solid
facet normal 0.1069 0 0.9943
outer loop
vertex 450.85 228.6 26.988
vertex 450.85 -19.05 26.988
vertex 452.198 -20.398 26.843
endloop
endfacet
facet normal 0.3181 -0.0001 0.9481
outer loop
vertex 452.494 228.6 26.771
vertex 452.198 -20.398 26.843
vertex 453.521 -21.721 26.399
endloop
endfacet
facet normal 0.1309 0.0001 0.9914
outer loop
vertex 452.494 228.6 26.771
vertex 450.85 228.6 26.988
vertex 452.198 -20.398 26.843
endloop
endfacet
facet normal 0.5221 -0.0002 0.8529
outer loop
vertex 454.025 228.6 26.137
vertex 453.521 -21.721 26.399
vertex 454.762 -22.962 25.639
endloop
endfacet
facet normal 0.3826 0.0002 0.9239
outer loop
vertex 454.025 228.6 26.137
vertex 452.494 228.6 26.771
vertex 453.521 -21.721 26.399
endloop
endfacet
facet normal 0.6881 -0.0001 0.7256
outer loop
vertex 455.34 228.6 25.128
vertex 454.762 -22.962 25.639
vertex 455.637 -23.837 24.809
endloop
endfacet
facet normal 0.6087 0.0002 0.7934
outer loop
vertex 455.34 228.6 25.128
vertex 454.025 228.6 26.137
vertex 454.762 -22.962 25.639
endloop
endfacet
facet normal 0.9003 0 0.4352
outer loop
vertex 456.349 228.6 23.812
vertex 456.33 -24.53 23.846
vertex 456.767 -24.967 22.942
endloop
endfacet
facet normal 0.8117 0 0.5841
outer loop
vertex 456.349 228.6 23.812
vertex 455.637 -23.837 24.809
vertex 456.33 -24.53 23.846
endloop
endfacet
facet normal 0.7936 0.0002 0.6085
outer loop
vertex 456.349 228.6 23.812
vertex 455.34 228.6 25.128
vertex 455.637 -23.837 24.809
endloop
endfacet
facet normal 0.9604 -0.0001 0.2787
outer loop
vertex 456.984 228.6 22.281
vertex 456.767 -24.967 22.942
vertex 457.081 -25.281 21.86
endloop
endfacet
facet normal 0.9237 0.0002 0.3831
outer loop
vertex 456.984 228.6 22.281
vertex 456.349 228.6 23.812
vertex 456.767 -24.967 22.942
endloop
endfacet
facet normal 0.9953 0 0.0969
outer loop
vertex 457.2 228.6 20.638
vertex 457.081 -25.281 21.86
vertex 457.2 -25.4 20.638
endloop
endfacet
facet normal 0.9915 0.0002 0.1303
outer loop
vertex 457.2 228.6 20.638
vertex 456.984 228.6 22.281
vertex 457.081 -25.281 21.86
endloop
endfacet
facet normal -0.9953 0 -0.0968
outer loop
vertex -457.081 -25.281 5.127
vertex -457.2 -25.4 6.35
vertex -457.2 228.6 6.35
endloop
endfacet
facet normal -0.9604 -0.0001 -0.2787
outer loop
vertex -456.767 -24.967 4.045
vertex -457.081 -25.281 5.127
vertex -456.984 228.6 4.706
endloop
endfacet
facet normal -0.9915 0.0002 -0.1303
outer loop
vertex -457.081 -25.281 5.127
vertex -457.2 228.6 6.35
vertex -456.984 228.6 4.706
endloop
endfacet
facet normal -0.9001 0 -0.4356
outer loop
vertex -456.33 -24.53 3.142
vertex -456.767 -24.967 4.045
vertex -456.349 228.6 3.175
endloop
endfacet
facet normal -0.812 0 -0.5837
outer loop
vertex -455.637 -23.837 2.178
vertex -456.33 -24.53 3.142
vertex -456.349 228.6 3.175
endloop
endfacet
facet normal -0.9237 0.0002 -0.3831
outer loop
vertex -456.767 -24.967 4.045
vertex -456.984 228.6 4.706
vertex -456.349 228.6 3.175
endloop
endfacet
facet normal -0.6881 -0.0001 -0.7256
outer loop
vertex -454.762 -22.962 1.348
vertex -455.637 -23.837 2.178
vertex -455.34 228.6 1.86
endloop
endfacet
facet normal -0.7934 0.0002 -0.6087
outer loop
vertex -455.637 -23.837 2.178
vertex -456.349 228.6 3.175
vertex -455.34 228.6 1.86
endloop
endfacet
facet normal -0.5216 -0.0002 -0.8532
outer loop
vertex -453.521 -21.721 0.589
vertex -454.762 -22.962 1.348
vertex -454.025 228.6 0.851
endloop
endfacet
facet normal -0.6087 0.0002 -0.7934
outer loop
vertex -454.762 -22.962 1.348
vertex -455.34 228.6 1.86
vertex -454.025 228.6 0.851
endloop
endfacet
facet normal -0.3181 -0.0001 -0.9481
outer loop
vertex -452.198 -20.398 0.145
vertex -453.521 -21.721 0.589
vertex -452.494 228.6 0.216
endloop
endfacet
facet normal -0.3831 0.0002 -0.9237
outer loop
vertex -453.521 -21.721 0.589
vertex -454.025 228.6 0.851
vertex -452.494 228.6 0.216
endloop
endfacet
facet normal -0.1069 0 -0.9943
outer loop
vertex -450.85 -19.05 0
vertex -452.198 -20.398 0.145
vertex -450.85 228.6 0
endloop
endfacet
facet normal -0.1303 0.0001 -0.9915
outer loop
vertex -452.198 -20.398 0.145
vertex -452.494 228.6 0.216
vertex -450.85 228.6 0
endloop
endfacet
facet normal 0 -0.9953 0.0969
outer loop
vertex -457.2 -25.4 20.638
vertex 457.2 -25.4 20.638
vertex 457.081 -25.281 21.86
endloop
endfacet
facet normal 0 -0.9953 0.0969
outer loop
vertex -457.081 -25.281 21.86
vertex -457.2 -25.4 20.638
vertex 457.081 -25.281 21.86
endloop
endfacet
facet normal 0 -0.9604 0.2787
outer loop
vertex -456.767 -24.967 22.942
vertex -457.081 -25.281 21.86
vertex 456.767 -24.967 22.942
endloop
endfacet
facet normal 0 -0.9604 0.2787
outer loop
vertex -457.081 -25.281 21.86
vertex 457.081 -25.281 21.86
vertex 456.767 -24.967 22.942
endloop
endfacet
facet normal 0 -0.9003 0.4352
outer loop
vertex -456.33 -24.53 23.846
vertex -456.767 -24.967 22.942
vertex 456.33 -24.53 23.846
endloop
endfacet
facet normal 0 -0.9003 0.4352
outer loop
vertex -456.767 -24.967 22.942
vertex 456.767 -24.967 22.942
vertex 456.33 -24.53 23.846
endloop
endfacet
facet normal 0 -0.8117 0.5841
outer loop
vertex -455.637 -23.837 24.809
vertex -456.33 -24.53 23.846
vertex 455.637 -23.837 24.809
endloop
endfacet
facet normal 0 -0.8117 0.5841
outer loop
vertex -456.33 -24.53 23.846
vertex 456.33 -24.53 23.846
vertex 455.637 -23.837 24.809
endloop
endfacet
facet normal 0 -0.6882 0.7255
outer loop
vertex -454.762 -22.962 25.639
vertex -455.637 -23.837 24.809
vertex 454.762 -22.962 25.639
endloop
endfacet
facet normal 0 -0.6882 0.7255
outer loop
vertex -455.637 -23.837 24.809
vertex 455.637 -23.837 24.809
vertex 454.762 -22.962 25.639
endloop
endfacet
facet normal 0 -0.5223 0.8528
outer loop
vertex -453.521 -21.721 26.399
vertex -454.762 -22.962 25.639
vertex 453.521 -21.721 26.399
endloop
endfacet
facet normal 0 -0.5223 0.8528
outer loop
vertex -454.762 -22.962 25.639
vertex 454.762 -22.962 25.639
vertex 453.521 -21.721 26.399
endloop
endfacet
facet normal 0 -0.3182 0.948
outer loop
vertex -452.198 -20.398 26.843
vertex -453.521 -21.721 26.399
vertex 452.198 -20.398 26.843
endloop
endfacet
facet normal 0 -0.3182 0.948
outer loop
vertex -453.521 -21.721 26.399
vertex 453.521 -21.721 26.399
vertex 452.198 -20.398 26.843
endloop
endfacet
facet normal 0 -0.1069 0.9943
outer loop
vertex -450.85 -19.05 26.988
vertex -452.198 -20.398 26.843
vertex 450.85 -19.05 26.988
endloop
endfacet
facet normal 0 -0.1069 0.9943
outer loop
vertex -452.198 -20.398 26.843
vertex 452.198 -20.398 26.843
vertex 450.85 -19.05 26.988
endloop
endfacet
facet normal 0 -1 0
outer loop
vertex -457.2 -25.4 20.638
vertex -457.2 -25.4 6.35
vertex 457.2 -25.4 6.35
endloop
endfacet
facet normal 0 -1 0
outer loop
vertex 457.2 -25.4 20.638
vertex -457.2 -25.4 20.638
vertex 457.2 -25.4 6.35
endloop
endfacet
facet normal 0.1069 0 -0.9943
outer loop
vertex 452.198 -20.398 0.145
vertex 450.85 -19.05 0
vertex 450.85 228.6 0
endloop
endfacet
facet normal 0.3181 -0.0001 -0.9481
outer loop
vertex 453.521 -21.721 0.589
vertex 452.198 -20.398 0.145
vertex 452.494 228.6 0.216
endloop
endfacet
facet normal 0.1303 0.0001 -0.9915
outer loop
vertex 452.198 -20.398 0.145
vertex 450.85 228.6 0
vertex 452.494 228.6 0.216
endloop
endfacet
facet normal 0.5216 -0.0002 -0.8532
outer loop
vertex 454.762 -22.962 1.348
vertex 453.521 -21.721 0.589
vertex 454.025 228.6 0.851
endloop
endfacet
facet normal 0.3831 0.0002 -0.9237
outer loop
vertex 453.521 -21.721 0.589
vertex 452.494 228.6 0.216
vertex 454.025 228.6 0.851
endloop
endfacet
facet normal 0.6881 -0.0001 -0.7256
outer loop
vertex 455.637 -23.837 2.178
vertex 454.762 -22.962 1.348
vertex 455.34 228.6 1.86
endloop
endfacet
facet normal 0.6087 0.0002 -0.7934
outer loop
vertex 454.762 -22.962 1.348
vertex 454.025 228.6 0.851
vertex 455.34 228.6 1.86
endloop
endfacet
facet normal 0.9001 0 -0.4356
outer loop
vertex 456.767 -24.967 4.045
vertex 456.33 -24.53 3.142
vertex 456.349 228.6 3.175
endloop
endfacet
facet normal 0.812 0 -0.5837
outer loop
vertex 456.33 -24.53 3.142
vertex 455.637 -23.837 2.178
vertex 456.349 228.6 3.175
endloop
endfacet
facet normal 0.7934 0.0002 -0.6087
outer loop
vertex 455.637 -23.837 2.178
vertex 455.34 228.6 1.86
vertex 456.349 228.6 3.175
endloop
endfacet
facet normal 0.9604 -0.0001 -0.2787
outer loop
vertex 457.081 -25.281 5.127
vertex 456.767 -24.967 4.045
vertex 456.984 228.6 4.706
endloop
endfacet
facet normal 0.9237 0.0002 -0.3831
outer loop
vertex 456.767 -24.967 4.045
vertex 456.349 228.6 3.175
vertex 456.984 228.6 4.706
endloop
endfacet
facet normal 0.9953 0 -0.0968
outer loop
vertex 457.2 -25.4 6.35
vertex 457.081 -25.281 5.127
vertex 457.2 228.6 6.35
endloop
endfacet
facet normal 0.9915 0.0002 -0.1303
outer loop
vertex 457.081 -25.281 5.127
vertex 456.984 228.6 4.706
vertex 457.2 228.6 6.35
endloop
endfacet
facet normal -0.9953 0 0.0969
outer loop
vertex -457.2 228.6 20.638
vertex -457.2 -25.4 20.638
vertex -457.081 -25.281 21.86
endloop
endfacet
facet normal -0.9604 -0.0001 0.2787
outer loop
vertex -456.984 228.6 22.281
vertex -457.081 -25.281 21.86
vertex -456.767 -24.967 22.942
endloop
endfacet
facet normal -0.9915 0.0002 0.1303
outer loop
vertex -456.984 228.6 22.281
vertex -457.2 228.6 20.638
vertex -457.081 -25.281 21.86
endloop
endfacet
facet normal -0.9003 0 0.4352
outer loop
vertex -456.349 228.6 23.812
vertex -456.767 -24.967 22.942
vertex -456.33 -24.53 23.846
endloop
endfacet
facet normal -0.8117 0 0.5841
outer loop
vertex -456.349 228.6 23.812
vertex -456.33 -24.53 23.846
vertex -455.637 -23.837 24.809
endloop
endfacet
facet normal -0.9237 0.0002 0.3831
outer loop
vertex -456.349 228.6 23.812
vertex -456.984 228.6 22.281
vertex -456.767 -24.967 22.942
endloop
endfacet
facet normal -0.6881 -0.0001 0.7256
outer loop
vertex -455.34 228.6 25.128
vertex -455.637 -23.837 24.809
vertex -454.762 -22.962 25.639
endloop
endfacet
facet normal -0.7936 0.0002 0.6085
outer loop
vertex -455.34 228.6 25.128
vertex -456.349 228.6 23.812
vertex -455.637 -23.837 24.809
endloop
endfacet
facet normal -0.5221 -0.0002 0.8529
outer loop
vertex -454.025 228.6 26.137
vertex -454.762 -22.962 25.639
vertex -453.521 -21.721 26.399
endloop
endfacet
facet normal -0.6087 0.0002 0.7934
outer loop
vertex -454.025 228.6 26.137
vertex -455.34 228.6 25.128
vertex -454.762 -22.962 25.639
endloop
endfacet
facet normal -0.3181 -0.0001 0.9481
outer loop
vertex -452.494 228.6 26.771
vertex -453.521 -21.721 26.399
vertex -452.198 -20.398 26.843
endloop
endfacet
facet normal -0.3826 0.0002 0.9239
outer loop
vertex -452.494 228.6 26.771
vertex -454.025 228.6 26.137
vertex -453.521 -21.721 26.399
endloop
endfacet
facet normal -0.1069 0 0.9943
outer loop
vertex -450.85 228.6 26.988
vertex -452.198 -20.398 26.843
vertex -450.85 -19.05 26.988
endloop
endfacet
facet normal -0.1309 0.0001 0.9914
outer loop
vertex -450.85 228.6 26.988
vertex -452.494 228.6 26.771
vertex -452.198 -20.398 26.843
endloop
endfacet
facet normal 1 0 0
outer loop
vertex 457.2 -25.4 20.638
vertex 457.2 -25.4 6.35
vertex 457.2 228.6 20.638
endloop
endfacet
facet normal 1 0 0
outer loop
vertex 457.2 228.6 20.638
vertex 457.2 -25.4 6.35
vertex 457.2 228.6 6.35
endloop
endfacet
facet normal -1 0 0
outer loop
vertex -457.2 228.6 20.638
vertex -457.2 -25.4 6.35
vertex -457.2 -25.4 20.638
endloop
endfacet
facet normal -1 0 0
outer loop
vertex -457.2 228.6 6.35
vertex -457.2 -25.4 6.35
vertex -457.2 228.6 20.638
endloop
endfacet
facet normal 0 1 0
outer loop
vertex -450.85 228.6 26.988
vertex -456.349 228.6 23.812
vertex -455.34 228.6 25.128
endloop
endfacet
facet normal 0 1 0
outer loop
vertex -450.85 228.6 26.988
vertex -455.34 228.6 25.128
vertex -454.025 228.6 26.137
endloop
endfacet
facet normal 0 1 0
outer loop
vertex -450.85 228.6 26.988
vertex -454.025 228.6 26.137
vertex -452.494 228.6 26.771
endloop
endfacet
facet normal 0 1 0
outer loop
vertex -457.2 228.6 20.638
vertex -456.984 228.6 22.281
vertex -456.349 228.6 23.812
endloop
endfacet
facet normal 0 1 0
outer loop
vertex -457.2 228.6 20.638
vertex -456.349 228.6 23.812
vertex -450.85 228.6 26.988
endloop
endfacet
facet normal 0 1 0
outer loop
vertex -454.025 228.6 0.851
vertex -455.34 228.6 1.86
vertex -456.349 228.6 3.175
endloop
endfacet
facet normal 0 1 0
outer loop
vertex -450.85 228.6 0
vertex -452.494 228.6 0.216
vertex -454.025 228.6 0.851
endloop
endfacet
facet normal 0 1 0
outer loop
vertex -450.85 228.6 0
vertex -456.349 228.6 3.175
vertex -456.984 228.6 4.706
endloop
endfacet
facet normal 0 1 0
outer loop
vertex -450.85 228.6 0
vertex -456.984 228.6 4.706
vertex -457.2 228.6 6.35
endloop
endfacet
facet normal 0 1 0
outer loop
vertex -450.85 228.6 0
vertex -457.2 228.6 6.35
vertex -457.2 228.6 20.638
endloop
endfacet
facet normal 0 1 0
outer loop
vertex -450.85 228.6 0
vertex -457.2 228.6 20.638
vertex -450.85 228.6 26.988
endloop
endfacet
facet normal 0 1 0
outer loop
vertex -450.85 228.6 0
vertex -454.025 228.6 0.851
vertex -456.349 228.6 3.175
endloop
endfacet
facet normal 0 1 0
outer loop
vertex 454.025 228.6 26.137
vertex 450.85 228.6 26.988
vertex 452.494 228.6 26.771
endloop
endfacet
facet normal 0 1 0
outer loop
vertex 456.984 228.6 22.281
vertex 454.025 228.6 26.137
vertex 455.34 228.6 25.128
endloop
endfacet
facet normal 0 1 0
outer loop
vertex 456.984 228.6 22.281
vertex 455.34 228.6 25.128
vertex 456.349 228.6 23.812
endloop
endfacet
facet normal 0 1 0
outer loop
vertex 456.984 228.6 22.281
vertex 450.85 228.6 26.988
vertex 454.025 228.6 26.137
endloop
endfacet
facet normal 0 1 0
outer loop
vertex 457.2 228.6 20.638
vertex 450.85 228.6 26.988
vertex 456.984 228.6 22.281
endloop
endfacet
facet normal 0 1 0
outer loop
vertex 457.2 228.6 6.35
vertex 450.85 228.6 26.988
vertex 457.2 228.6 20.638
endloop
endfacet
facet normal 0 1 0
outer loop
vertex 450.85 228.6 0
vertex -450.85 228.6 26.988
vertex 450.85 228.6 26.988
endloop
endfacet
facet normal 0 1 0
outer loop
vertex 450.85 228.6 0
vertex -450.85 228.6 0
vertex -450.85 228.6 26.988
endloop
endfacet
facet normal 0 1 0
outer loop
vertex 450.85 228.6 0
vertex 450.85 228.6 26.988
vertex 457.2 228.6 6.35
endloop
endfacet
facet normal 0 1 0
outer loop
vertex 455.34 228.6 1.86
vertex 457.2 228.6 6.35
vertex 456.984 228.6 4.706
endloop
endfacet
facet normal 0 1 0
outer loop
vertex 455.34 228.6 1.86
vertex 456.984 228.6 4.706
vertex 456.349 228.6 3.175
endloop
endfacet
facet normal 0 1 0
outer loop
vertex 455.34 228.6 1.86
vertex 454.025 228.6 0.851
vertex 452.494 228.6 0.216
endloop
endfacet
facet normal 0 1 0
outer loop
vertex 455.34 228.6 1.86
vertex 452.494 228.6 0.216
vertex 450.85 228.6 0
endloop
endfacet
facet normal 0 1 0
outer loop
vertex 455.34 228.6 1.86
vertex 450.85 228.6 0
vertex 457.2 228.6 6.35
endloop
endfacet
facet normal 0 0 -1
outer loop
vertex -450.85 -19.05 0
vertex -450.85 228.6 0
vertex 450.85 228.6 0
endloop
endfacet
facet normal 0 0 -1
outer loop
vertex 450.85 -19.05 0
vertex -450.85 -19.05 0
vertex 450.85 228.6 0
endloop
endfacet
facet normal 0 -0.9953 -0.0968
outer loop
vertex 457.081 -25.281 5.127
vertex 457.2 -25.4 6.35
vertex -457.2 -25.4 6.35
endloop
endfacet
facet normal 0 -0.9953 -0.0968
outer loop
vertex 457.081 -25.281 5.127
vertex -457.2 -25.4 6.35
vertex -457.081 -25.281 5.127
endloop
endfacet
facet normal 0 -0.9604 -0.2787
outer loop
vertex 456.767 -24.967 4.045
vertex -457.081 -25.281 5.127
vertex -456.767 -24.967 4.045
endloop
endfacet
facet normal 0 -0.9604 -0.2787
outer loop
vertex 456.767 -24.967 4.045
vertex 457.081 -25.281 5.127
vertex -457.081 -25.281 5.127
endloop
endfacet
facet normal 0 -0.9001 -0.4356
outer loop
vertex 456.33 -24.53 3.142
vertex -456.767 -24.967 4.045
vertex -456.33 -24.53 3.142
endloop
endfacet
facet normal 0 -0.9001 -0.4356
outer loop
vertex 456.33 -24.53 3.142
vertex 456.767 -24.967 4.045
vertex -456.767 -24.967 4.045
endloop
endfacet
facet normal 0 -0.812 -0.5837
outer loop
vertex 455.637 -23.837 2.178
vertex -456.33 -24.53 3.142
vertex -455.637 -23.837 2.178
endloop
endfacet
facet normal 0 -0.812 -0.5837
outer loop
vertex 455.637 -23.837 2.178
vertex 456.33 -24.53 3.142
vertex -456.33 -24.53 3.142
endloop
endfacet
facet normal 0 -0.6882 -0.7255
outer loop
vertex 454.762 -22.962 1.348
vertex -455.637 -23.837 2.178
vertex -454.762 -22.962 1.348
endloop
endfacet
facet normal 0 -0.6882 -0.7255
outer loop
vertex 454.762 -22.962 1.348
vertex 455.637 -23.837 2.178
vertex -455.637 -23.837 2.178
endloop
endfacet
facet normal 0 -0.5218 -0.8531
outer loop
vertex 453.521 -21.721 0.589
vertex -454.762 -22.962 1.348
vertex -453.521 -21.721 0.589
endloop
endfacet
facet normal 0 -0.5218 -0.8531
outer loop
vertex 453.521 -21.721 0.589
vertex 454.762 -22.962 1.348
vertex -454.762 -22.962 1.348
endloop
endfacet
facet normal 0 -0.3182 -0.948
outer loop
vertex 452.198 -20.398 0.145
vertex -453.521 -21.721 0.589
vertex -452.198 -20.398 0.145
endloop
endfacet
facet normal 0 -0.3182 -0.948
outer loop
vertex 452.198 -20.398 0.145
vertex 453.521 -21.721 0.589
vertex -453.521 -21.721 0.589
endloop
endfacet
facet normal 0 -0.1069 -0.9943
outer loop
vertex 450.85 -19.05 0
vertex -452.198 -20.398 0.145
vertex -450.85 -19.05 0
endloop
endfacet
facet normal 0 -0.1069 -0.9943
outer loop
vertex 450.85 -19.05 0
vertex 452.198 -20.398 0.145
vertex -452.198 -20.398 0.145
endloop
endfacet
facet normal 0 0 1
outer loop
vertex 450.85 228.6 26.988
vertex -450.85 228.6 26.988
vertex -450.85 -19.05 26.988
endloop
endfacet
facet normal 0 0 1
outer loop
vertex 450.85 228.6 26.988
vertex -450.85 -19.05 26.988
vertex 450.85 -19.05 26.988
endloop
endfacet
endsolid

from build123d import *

# Parameters (mm, degrees)
F0_W        = 914.4
F0_H        = 254
F1_DEPTH    = 26.9875
F2_R        = 6.35
F3_T1_DEPTH = 279.4
F4_T1_DEPTH = 279.4


# Not quite as in the source:
# - a fillet or chamfer that OpenCascade refuses, or shapes differently, is made with other operations: its cross-section is extruded or revolved along the edge and cut away or added


with BuildPart() as f1:
    # F0 (on Top) → F1 (new body)
    with BuildSketch(Plane.XY):
        with Locations((0, 101.6)):
            Rectangle(F0_W, F0_H)
    extrude(amount=F1_DEPTH)

    # F2
    f2_edges = [f1.edges().sort_by_distance(p)[0] for p in [
        (0, -25.4, 26.9875),
        (0, -25.4, 0),
    ]]
    fillet(f2_edges, radius=F2_R)

    # F3: fillet of radius 6.35 on 2 edges, made by hand

    # F3_s2 → F3_t1 (cut)
    with BuildSketch(Plane.XZ.offset(-244.475)):
        with BuildLine():
            ThreePointArc((450.85, 26.9875), (455.3401280605, 25.1276280605), (457.2, 20.6375))
            Line((457.2, 20.6375), (457.2, 26.9875))
            Line((457.2, 26.9875), (450.85, 26.9875))
        make_face()
        with BuildLine():
            ThreePointArc((450.85, 0), (455.3401280605, 1.8598719395), (457.2, 6.35))
            Line((457.2, 6.35), (457.2, 0))
            Line((457.2, 0), (450.85, 0))
        make_face()
    extrude(amount=F3_T1_DEPTH, mode=Mode.SUBTRACT)

    # F4: fillet of radius 6.35 on 2 edges, made by hand

    # F4_s2 → F4_t1 (cut)
    with BuildSketch(Plane.XZ.offset(-244.475)):
        with BuildLine():
            ThreePointArc((-457.2, 6.35), (-455.3401280605, 1.8598719395), (-450.85, 0))
            Line((-450.85, 0), (-457.2, 0))
            Line((-457.2, 0), (-457.2, 6.35))
        make_face()
        with BuildLine():
            ThreePointArc((-457.2, 20.6375), (-455.3401280605, 25.1276280605), (-450.85, 26.9875))
            Line((-450.85, 26.9875), (-457.2, 26.9875))
            Line((-457.2, 26.9875), (-457.2, 20.6375))
        make_face()
    extrude(amount=F4_T1_DEPTH, mode=Mode.SUBTRACT)


solid = f1.part
